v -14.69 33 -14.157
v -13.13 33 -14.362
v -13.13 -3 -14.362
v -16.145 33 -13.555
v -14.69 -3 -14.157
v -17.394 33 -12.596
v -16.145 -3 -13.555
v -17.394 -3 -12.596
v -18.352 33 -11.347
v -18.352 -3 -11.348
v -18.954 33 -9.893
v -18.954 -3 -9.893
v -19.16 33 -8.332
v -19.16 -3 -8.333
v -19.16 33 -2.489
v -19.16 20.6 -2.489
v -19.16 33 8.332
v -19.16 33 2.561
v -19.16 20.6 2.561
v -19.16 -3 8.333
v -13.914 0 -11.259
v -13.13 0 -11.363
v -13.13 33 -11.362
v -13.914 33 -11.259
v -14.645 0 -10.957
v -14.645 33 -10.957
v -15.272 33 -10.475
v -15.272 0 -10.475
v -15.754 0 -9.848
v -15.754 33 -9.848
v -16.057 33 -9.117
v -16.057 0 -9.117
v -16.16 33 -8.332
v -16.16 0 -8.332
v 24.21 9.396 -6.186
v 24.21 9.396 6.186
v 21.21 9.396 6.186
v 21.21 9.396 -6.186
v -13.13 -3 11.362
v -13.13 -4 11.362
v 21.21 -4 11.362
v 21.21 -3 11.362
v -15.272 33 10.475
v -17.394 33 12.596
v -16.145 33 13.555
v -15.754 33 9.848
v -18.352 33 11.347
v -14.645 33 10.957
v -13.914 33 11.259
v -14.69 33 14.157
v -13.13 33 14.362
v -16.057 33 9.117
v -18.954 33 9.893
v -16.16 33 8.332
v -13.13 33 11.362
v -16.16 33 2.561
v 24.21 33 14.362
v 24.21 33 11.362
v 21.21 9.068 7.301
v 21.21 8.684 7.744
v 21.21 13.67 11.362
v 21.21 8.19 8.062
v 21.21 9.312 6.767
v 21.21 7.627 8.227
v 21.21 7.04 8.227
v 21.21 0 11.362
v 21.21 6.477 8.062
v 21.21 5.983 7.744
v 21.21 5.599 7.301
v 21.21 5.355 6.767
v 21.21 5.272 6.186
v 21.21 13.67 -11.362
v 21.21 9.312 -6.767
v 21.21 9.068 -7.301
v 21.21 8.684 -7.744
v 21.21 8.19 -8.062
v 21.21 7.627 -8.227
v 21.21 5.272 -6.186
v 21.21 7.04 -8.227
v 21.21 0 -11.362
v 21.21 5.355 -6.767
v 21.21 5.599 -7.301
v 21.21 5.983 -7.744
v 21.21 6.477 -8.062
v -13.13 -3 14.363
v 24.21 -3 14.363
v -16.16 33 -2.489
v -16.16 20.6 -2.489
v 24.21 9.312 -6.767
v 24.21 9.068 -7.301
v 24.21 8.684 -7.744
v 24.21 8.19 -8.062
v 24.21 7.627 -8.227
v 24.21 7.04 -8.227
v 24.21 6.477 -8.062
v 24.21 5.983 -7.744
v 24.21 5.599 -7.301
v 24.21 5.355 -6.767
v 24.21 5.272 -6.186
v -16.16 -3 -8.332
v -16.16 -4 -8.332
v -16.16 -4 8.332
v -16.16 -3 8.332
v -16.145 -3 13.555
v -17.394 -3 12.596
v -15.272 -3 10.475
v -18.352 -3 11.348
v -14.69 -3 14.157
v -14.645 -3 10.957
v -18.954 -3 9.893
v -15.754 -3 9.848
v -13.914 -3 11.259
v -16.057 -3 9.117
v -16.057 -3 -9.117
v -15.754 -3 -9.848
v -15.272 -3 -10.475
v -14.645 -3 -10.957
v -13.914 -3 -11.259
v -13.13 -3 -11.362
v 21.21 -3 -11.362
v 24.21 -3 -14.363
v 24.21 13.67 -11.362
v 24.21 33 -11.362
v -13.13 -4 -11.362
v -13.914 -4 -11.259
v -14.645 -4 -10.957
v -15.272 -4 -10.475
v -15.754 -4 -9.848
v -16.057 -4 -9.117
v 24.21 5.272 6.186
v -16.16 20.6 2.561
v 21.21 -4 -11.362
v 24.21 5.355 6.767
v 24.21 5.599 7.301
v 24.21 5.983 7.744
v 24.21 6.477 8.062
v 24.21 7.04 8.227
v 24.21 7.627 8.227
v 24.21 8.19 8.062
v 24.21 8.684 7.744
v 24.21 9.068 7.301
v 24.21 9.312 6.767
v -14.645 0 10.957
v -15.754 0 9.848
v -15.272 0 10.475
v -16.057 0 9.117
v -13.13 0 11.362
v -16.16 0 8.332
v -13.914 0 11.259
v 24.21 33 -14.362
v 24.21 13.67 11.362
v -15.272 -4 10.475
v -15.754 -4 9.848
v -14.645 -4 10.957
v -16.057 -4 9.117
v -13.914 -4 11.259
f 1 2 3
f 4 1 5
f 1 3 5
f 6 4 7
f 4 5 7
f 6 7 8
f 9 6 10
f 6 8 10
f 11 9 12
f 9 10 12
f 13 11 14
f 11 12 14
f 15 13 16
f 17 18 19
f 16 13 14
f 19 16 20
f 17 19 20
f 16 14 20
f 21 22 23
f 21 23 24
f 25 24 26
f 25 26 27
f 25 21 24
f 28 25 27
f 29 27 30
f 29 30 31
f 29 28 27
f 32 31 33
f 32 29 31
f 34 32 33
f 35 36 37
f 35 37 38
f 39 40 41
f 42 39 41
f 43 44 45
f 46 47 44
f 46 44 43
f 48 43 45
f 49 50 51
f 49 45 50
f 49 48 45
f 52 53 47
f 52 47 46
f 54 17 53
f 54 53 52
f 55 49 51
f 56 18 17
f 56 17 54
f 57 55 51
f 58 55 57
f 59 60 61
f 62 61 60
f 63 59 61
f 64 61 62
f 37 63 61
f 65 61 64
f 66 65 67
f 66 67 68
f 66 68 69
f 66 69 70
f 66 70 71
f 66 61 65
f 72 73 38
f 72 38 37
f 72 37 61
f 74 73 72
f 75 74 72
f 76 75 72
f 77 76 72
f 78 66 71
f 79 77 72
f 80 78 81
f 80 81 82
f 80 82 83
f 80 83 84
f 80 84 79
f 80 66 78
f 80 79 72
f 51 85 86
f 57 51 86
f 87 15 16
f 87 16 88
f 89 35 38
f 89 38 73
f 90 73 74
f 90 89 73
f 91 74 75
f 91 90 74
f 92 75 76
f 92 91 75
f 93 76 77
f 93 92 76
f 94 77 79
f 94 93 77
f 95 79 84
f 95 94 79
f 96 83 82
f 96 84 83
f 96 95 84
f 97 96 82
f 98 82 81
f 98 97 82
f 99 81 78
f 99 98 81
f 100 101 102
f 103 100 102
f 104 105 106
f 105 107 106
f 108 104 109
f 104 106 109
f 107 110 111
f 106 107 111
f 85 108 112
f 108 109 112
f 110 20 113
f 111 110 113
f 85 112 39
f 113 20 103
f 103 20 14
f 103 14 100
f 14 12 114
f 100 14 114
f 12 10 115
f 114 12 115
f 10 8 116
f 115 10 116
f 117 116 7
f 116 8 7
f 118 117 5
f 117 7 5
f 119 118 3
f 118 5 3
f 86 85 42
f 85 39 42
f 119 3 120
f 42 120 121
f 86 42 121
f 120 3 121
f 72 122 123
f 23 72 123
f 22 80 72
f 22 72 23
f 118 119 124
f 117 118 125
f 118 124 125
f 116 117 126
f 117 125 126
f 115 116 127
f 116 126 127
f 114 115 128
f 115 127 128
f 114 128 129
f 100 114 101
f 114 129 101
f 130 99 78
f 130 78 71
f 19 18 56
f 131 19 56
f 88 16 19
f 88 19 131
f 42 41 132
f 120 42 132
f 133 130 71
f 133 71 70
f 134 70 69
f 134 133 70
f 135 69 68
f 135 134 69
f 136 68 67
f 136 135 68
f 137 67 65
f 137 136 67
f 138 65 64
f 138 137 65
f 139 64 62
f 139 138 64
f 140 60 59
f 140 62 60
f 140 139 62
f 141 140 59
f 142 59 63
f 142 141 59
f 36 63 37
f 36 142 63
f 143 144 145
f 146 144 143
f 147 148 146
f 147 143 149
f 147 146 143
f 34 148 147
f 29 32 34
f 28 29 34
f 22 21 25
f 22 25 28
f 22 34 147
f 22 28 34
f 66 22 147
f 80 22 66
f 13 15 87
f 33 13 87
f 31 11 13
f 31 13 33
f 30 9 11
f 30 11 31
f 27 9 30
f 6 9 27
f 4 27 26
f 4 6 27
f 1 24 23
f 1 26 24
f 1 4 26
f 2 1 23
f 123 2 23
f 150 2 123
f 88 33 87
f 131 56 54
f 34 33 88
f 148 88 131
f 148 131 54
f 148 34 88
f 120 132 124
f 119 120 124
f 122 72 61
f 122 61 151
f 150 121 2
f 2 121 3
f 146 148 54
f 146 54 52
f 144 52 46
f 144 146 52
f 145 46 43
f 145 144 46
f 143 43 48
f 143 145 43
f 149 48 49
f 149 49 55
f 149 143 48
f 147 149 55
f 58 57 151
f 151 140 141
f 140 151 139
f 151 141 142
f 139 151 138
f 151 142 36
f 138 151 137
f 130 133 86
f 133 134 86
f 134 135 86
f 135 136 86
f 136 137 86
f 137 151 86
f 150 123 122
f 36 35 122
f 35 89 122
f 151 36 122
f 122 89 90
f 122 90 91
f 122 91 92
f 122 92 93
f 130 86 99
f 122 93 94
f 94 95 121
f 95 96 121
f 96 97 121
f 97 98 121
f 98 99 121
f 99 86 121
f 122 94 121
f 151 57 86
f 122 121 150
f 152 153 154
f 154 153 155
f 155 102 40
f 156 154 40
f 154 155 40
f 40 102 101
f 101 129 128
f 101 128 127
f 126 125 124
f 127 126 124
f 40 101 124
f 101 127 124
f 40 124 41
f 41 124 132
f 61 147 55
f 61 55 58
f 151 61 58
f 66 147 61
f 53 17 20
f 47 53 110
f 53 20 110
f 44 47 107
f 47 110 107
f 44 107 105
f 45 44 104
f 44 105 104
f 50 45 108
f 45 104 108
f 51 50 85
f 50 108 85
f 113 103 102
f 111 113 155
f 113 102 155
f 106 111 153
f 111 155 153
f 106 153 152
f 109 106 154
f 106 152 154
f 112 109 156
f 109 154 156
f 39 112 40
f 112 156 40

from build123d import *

# Parameters (mm, degrees)
BOSS_EXTRUDE1_DEPTH = 33
SHELL2_T            = 3
SKETCH5_W           = 22.725
SKETCH5_H           = 33
CUT_EXTRUDE1_DEPTH  = 33
CUT_EXTRUDE3_START  = 20.6
SKETCH2_4_W         = 5.050381124
SKETCH2_4_H         = 5.05
CUT_EXTRUDE3_DEPTH  = 33
BOSS_EXTRUDE2_START = -4
BOSS_EXTRUDE2_DEPTH = 4
SKETCH6_W           = 3
SKETCH6_H           = 22.725
BOSS_EXTRUDE3_DEPTH = 13.67
CUT_EXTRUDE5_DEPTH  = 13.67


with BuildPart() as part:
    # Sketch2 → Boss-Extrude1 (new body)
    with BuildSketch(Plane(origin=(0, 0, 0), x_dir=(1, 0, 0), z_dir=(0, 1, 0))):
        with BuildLine():
            Line((-16.159809438, 2.488564903), (-16.159809438, -2.561435097))
            Line((-16.159809438, -2.561435097), (-16.159809438, -8.3325))
            ThreePointArc((-16.159809438, -8.3325), (-15.272342985, -10.475033547), (-13.129809438, -11.3625))
            Line((-13.129809438, -11.3625), (21.210190562, -11.3625))
            Line((21.210190562, -11.3625), (21.210190562, 11.3625))
            Line((21.210190562, 11.3625), (-13.129809438, 11.3625))
            ThreePointArc((-13.129809438, 11.3625), (-15.272342985, 10.475033547), (-16.159809438, 8.3325))
            Line((-16.159809438, 8.3325), (-16.159809438, 2.488564903))
        make_face()
    extrude(amount=BOSS_EXTRUDE1_DEPTH)

    # Shell2
    shell2_openings = [part.faces().sort_by_distance(p)[0] for p in [
        (2.609138826, 33, 0),
    ]]
    offset(amount=SHELL2_T, openings=shell2_openings, kind=Kind.INTERSECTION)

    # Sketch5 → Cut-Extrude1 (cut)
    with BuildSketch(Plane.ZY.offset(-21.210190562)):
        with Locations((0, 16.5)):
            Rectangle(SKETCH5_W, SKETCH5_H)
    extrude(amount=-CUT_EXTRUDE1_DEPTH, mode=Mode.SUBTRACT)

    # Sketch2<4> → Cut-Extrude3 (cut)
    with BuildSketch(Plane(origin=(0, 0, 0), x_dir=(1, 0, 0), z_dir=(0, 1, 0)).offset(CUT_EXTRUDE3_START)):
        with Locations((-18.685, -0.036435097)):
            Rectangle(SKETCH2_4_W, SKETCH2_4_H)
    extrude(amount=CUT_EXTRUDE3_DEPTH, mode=Mode.SUBTRACT)

    # Sketch2<6> → Boss-Extrude2 (add)
    with BuildSketch(Plane(origin=(0, 0, 0), x_dir=(1, 0, 0), z_dir=(0, 1, 0)).offset(BOSS_EXTRUDE2_START)):
        with BuildLine():
            Line((-16.159809438, 2.488564903), (-16.159809438, -2.561435097))
            Line((-16.159809438, -2.561435097), (-16.159809438, -8.3325))
            ThreePointArc((-16.159809438, -8.3325), (-15.272342985, -10.475033547), (-13.129809438, -11.3625))
            Line((-13.129809438, -11.3625), (21.210190562, -11.3625))
            Line((21.210190562, -11.3625), (21.210190562, 11.3625))
            Line((21.210190562, 11.3625), (-13.129809438, 11.3625))
            ThreePointArc((-13.129809438, 11.3625), (-15.272342985, 10.475033547), (-16.159809438, 8.3325))
            Line((-16.159809438, 8.3325), (-16.159809438, 2.488564903))
        make_face()
    extrude(amount=BOSS_EXTRUDE2_DEPTH)

    # Sketch6 → Boss-Extrude3 (add)
    with BuildSketch(Plane(origin=(0, 0, 0), x_dir=(1, 0, 0), z_dir=(0, 1, 0))):
        with Locations((22.710190562, 0)):
            Rectangle(SKETCH6_W, SKETCH6_H)
    extrude(amount=BOSS_EXTRUDE3_DEPTH)

    # Sketch7 → Cut-Extrude5 (cut)
    with BuildSketch(Plane(origin=(24.210190562, 0, 0), x_dir=(0, 0, -1), z_dir=(1, 0, 0))):
        with BuildLine():
            Line((-6.185942712, 9.395589147), (6.185942712, 9.395589147))
            ThreePointArc((6.185942712, 9.395589147), (8.247923616, 7.333608243), (6.185942712, 5.271627338))
            Line((6.185942712, 5.271627338), (-6.185942712, 5.271627338))
            ThreePointArc((-6.185942712, 5.271627338), (-8.247923616, 7.333608243), (-6.185942712, 9.395589147))
        make_face()
    extrude(amount=-CUT_EXTRUDE5_DEPTH, mode=Mode.SUBTRACT)


solid = part.part
